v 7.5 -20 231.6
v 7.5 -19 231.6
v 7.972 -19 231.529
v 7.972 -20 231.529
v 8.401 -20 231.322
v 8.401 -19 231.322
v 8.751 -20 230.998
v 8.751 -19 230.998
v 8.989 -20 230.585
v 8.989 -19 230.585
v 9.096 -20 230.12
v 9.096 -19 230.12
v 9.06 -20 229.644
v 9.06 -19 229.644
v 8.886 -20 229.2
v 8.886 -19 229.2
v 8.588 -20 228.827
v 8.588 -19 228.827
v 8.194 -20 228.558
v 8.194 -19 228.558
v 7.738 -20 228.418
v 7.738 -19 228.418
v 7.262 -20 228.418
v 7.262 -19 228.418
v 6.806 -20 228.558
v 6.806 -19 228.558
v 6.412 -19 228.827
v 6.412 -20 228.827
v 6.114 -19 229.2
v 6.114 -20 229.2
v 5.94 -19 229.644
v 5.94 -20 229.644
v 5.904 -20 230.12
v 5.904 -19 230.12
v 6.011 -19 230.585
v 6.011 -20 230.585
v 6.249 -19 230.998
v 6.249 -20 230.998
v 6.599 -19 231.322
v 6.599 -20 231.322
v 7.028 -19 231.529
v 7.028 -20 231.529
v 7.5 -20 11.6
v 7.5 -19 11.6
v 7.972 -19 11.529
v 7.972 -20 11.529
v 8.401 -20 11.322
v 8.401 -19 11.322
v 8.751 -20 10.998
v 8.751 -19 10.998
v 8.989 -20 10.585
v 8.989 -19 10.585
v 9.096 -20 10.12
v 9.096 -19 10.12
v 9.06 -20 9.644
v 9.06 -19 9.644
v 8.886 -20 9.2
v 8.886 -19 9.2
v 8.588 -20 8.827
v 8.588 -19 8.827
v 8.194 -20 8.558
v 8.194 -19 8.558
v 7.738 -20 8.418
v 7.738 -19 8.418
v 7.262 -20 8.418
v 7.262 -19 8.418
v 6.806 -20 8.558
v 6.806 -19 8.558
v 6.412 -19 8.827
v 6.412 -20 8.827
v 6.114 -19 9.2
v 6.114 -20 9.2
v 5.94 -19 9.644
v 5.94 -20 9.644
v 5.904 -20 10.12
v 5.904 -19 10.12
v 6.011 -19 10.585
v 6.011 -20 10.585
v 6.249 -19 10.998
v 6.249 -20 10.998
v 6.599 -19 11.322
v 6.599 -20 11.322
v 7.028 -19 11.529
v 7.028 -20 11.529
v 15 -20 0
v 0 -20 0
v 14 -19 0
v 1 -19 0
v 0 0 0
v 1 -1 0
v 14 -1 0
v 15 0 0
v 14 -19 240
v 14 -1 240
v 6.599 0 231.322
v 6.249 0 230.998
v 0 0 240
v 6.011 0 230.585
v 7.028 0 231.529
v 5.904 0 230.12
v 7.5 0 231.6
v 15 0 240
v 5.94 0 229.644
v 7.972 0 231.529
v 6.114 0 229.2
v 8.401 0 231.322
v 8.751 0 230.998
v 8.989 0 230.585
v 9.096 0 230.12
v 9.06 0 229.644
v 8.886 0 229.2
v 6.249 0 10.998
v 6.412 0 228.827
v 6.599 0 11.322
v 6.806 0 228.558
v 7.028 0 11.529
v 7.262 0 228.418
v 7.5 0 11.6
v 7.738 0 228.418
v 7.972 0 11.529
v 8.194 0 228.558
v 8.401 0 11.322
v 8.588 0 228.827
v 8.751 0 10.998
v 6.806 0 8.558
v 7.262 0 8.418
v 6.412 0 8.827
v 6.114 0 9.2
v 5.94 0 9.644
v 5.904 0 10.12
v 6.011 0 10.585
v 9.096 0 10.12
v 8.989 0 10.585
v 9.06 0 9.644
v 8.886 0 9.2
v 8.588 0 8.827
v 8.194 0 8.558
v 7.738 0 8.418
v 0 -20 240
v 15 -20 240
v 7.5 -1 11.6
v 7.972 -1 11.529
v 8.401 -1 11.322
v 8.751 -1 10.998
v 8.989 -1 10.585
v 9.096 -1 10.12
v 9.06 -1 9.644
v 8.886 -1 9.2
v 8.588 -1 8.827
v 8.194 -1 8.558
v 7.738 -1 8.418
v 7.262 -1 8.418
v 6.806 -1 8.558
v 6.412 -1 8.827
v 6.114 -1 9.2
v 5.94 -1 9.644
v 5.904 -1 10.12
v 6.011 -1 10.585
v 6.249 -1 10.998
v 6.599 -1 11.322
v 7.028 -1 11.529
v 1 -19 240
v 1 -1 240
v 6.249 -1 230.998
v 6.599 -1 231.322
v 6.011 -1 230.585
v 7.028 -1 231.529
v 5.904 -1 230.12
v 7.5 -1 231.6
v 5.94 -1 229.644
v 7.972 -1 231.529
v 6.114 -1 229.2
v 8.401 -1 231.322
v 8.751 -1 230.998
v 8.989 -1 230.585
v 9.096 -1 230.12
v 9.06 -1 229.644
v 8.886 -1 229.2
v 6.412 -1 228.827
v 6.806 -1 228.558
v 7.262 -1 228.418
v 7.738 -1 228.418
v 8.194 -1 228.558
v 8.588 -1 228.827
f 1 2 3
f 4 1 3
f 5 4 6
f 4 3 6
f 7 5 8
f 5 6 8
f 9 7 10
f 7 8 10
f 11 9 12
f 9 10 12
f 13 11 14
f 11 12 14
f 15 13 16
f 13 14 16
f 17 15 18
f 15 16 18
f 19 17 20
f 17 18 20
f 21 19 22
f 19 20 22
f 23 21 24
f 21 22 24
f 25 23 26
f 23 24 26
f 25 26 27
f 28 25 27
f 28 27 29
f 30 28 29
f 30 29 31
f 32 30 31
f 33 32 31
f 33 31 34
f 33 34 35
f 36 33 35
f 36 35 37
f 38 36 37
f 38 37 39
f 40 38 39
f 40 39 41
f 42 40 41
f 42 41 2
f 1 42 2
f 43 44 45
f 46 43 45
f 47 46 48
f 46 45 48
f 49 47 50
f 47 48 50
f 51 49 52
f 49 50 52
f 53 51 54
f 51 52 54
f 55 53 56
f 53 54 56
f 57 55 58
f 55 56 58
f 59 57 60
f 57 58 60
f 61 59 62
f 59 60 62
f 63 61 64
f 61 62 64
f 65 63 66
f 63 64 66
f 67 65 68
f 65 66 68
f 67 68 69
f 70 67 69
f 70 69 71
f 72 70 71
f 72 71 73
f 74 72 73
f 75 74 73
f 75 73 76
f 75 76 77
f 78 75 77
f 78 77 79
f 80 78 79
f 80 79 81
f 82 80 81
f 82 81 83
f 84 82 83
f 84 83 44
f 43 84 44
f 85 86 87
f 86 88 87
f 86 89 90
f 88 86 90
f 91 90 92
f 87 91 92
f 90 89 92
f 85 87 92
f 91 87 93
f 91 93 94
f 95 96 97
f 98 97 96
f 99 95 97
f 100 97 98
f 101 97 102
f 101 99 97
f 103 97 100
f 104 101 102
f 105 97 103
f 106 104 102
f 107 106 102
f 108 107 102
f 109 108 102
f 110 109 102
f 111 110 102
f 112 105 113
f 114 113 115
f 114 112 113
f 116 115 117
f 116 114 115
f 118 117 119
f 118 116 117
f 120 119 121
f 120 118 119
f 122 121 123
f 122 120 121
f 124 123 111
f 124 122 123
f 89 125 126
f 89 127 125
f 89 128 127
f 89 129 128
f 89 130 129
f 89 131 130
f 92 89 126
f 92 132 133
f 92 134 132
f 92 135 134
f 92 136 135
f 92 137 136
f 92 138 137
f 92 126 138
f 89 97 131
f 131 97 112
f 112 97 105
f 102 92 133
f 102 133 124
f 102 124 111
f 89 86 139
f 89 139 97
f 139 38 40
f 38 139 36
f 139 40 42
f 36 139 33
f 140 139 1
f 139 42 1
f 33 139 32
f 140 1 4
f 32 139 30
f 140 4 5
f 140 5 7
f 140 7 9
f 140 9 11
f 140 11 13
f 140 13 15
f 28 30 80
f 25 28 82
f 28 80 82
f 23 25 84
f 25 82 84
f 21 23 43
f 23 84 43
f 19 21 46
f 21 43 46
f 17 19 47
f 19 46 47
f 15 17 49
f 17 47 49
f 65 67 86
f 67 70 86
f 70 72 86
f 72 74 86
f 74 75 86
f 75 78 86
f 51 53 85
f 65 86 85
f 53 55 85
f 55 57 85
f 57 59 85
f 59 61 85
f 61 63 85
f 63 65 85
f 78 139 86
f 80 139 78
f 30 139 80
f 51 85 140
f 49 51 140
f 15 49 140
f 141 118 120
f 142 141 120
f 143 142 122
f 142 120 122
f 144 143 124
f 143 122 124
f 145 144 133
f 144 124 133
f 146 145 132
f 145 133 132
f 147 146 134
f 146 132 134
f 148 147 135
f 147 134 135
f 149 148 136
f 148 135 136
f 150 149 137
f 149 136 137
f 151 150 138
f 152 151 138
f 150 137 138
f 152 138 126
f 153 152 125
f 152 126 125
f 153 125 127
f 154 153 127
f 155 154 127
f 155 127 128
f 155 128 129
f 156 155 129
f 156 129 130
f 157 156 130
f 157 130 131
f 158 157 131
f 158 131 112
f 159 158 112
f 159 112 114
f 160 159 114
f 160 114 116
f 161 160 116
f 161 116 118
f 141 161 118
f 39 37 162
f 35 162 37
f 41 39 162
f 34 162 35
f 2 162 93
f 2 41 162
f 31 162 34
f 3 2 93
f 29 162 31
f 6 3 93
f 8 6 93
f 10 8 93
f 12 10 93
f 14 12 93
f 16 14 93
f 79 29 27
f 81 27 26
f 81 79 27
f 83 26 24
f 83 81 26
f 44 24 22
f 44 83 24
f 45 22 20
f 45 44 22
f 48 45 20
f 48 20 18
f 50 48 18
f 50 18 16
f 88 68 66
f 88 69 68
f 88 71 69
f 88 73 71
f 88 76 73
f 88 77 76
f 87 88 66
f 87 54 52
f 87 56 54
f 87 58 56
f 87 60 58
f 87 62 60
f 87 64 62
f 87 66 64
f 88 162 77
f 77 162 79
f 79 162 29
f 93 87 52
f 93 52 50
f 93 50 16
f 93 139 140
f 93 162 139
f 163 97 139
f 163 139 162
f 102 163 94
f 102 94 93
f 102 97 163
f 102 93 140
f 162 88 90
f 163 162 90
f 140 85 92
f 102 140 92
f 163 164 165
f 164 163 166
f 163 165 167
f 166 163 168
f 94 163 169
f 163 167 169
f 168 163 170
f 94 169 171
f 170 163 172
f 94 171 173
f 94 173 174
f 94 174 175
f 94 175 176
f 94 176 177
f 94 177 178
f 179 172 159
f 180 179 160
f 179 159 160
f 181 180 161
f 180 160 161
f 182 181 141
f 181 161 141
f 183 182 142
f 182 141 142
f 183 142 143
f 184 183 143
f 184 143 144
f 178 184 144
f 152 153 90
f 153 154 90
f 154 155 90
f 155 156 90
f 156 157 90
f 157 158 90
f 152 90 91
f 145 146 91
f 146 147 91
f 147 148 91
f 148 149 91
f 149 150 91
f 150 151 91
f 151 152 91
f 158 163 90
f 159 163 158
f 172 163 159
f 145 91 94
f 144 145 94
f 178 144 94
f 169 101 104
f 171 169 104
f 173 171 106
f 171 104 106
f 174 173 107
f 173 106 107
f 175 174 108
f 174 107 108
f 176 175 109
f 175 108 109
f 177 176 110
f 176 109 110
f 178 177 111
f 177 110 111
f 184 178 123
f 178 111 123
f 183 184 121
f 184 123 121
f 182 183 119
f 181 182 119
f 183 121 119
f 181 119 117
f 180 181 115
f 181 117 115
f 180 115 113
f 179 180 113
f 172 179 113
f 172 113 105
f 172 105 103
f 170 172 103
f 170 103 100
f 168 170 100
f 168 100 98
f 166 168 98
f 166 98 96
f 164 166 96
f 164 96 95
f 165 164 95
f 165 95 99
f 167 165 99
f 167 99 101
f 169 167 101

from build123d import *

# Parameters (mm, degrees)
SKETCH_1_W          = 15
SKETCH_1_H          = 20
SKETCH_1_W_2        = 13
SKETCH_1_H_2        = 18
EXTRUDE_1_DEPTH     = 240
SKETCH_3_R          = 1.6
CUT_EXTRUDE_2_DEPTH = 242.29857024


with BuildPart() as part:
    # 草图1 → 拉伸-薄壁1 (new body)
    with BuildSketch(Plane.XY):
        with Locations((7.5, -10)):
            Rectangle(SKETCH_1_W, SKETCH_1_H)
        with Locations((7.5, -10)):
            Rectangle(SKETCH_1_W_2, SKETCH_1_H_2, mode=Mode.SUBTRACT)
    extrude(amount=EXTRUDE_1_DEPTH)

    # 草图3 → 切除-拉伸2 (cut, through all)
    with BuildSketch(Plane(origin=(0, 0, 0), x_dir=(1, 0, 0), z_dir=(0, 1, 0))):
        with Locations(Location((7.5, -10, 0), (0, 0, 270))):
            Circle(SKETCH_3_R)
        with Locations(Location((7.5, -230, 0), (0, 0, 270))):
            Circle(SKETCH_3_R)
    extrude(amount=-CUT_EXTRUDE_2_DEPTH, mode=Mode.SUBTRACT)


solid = part.part
